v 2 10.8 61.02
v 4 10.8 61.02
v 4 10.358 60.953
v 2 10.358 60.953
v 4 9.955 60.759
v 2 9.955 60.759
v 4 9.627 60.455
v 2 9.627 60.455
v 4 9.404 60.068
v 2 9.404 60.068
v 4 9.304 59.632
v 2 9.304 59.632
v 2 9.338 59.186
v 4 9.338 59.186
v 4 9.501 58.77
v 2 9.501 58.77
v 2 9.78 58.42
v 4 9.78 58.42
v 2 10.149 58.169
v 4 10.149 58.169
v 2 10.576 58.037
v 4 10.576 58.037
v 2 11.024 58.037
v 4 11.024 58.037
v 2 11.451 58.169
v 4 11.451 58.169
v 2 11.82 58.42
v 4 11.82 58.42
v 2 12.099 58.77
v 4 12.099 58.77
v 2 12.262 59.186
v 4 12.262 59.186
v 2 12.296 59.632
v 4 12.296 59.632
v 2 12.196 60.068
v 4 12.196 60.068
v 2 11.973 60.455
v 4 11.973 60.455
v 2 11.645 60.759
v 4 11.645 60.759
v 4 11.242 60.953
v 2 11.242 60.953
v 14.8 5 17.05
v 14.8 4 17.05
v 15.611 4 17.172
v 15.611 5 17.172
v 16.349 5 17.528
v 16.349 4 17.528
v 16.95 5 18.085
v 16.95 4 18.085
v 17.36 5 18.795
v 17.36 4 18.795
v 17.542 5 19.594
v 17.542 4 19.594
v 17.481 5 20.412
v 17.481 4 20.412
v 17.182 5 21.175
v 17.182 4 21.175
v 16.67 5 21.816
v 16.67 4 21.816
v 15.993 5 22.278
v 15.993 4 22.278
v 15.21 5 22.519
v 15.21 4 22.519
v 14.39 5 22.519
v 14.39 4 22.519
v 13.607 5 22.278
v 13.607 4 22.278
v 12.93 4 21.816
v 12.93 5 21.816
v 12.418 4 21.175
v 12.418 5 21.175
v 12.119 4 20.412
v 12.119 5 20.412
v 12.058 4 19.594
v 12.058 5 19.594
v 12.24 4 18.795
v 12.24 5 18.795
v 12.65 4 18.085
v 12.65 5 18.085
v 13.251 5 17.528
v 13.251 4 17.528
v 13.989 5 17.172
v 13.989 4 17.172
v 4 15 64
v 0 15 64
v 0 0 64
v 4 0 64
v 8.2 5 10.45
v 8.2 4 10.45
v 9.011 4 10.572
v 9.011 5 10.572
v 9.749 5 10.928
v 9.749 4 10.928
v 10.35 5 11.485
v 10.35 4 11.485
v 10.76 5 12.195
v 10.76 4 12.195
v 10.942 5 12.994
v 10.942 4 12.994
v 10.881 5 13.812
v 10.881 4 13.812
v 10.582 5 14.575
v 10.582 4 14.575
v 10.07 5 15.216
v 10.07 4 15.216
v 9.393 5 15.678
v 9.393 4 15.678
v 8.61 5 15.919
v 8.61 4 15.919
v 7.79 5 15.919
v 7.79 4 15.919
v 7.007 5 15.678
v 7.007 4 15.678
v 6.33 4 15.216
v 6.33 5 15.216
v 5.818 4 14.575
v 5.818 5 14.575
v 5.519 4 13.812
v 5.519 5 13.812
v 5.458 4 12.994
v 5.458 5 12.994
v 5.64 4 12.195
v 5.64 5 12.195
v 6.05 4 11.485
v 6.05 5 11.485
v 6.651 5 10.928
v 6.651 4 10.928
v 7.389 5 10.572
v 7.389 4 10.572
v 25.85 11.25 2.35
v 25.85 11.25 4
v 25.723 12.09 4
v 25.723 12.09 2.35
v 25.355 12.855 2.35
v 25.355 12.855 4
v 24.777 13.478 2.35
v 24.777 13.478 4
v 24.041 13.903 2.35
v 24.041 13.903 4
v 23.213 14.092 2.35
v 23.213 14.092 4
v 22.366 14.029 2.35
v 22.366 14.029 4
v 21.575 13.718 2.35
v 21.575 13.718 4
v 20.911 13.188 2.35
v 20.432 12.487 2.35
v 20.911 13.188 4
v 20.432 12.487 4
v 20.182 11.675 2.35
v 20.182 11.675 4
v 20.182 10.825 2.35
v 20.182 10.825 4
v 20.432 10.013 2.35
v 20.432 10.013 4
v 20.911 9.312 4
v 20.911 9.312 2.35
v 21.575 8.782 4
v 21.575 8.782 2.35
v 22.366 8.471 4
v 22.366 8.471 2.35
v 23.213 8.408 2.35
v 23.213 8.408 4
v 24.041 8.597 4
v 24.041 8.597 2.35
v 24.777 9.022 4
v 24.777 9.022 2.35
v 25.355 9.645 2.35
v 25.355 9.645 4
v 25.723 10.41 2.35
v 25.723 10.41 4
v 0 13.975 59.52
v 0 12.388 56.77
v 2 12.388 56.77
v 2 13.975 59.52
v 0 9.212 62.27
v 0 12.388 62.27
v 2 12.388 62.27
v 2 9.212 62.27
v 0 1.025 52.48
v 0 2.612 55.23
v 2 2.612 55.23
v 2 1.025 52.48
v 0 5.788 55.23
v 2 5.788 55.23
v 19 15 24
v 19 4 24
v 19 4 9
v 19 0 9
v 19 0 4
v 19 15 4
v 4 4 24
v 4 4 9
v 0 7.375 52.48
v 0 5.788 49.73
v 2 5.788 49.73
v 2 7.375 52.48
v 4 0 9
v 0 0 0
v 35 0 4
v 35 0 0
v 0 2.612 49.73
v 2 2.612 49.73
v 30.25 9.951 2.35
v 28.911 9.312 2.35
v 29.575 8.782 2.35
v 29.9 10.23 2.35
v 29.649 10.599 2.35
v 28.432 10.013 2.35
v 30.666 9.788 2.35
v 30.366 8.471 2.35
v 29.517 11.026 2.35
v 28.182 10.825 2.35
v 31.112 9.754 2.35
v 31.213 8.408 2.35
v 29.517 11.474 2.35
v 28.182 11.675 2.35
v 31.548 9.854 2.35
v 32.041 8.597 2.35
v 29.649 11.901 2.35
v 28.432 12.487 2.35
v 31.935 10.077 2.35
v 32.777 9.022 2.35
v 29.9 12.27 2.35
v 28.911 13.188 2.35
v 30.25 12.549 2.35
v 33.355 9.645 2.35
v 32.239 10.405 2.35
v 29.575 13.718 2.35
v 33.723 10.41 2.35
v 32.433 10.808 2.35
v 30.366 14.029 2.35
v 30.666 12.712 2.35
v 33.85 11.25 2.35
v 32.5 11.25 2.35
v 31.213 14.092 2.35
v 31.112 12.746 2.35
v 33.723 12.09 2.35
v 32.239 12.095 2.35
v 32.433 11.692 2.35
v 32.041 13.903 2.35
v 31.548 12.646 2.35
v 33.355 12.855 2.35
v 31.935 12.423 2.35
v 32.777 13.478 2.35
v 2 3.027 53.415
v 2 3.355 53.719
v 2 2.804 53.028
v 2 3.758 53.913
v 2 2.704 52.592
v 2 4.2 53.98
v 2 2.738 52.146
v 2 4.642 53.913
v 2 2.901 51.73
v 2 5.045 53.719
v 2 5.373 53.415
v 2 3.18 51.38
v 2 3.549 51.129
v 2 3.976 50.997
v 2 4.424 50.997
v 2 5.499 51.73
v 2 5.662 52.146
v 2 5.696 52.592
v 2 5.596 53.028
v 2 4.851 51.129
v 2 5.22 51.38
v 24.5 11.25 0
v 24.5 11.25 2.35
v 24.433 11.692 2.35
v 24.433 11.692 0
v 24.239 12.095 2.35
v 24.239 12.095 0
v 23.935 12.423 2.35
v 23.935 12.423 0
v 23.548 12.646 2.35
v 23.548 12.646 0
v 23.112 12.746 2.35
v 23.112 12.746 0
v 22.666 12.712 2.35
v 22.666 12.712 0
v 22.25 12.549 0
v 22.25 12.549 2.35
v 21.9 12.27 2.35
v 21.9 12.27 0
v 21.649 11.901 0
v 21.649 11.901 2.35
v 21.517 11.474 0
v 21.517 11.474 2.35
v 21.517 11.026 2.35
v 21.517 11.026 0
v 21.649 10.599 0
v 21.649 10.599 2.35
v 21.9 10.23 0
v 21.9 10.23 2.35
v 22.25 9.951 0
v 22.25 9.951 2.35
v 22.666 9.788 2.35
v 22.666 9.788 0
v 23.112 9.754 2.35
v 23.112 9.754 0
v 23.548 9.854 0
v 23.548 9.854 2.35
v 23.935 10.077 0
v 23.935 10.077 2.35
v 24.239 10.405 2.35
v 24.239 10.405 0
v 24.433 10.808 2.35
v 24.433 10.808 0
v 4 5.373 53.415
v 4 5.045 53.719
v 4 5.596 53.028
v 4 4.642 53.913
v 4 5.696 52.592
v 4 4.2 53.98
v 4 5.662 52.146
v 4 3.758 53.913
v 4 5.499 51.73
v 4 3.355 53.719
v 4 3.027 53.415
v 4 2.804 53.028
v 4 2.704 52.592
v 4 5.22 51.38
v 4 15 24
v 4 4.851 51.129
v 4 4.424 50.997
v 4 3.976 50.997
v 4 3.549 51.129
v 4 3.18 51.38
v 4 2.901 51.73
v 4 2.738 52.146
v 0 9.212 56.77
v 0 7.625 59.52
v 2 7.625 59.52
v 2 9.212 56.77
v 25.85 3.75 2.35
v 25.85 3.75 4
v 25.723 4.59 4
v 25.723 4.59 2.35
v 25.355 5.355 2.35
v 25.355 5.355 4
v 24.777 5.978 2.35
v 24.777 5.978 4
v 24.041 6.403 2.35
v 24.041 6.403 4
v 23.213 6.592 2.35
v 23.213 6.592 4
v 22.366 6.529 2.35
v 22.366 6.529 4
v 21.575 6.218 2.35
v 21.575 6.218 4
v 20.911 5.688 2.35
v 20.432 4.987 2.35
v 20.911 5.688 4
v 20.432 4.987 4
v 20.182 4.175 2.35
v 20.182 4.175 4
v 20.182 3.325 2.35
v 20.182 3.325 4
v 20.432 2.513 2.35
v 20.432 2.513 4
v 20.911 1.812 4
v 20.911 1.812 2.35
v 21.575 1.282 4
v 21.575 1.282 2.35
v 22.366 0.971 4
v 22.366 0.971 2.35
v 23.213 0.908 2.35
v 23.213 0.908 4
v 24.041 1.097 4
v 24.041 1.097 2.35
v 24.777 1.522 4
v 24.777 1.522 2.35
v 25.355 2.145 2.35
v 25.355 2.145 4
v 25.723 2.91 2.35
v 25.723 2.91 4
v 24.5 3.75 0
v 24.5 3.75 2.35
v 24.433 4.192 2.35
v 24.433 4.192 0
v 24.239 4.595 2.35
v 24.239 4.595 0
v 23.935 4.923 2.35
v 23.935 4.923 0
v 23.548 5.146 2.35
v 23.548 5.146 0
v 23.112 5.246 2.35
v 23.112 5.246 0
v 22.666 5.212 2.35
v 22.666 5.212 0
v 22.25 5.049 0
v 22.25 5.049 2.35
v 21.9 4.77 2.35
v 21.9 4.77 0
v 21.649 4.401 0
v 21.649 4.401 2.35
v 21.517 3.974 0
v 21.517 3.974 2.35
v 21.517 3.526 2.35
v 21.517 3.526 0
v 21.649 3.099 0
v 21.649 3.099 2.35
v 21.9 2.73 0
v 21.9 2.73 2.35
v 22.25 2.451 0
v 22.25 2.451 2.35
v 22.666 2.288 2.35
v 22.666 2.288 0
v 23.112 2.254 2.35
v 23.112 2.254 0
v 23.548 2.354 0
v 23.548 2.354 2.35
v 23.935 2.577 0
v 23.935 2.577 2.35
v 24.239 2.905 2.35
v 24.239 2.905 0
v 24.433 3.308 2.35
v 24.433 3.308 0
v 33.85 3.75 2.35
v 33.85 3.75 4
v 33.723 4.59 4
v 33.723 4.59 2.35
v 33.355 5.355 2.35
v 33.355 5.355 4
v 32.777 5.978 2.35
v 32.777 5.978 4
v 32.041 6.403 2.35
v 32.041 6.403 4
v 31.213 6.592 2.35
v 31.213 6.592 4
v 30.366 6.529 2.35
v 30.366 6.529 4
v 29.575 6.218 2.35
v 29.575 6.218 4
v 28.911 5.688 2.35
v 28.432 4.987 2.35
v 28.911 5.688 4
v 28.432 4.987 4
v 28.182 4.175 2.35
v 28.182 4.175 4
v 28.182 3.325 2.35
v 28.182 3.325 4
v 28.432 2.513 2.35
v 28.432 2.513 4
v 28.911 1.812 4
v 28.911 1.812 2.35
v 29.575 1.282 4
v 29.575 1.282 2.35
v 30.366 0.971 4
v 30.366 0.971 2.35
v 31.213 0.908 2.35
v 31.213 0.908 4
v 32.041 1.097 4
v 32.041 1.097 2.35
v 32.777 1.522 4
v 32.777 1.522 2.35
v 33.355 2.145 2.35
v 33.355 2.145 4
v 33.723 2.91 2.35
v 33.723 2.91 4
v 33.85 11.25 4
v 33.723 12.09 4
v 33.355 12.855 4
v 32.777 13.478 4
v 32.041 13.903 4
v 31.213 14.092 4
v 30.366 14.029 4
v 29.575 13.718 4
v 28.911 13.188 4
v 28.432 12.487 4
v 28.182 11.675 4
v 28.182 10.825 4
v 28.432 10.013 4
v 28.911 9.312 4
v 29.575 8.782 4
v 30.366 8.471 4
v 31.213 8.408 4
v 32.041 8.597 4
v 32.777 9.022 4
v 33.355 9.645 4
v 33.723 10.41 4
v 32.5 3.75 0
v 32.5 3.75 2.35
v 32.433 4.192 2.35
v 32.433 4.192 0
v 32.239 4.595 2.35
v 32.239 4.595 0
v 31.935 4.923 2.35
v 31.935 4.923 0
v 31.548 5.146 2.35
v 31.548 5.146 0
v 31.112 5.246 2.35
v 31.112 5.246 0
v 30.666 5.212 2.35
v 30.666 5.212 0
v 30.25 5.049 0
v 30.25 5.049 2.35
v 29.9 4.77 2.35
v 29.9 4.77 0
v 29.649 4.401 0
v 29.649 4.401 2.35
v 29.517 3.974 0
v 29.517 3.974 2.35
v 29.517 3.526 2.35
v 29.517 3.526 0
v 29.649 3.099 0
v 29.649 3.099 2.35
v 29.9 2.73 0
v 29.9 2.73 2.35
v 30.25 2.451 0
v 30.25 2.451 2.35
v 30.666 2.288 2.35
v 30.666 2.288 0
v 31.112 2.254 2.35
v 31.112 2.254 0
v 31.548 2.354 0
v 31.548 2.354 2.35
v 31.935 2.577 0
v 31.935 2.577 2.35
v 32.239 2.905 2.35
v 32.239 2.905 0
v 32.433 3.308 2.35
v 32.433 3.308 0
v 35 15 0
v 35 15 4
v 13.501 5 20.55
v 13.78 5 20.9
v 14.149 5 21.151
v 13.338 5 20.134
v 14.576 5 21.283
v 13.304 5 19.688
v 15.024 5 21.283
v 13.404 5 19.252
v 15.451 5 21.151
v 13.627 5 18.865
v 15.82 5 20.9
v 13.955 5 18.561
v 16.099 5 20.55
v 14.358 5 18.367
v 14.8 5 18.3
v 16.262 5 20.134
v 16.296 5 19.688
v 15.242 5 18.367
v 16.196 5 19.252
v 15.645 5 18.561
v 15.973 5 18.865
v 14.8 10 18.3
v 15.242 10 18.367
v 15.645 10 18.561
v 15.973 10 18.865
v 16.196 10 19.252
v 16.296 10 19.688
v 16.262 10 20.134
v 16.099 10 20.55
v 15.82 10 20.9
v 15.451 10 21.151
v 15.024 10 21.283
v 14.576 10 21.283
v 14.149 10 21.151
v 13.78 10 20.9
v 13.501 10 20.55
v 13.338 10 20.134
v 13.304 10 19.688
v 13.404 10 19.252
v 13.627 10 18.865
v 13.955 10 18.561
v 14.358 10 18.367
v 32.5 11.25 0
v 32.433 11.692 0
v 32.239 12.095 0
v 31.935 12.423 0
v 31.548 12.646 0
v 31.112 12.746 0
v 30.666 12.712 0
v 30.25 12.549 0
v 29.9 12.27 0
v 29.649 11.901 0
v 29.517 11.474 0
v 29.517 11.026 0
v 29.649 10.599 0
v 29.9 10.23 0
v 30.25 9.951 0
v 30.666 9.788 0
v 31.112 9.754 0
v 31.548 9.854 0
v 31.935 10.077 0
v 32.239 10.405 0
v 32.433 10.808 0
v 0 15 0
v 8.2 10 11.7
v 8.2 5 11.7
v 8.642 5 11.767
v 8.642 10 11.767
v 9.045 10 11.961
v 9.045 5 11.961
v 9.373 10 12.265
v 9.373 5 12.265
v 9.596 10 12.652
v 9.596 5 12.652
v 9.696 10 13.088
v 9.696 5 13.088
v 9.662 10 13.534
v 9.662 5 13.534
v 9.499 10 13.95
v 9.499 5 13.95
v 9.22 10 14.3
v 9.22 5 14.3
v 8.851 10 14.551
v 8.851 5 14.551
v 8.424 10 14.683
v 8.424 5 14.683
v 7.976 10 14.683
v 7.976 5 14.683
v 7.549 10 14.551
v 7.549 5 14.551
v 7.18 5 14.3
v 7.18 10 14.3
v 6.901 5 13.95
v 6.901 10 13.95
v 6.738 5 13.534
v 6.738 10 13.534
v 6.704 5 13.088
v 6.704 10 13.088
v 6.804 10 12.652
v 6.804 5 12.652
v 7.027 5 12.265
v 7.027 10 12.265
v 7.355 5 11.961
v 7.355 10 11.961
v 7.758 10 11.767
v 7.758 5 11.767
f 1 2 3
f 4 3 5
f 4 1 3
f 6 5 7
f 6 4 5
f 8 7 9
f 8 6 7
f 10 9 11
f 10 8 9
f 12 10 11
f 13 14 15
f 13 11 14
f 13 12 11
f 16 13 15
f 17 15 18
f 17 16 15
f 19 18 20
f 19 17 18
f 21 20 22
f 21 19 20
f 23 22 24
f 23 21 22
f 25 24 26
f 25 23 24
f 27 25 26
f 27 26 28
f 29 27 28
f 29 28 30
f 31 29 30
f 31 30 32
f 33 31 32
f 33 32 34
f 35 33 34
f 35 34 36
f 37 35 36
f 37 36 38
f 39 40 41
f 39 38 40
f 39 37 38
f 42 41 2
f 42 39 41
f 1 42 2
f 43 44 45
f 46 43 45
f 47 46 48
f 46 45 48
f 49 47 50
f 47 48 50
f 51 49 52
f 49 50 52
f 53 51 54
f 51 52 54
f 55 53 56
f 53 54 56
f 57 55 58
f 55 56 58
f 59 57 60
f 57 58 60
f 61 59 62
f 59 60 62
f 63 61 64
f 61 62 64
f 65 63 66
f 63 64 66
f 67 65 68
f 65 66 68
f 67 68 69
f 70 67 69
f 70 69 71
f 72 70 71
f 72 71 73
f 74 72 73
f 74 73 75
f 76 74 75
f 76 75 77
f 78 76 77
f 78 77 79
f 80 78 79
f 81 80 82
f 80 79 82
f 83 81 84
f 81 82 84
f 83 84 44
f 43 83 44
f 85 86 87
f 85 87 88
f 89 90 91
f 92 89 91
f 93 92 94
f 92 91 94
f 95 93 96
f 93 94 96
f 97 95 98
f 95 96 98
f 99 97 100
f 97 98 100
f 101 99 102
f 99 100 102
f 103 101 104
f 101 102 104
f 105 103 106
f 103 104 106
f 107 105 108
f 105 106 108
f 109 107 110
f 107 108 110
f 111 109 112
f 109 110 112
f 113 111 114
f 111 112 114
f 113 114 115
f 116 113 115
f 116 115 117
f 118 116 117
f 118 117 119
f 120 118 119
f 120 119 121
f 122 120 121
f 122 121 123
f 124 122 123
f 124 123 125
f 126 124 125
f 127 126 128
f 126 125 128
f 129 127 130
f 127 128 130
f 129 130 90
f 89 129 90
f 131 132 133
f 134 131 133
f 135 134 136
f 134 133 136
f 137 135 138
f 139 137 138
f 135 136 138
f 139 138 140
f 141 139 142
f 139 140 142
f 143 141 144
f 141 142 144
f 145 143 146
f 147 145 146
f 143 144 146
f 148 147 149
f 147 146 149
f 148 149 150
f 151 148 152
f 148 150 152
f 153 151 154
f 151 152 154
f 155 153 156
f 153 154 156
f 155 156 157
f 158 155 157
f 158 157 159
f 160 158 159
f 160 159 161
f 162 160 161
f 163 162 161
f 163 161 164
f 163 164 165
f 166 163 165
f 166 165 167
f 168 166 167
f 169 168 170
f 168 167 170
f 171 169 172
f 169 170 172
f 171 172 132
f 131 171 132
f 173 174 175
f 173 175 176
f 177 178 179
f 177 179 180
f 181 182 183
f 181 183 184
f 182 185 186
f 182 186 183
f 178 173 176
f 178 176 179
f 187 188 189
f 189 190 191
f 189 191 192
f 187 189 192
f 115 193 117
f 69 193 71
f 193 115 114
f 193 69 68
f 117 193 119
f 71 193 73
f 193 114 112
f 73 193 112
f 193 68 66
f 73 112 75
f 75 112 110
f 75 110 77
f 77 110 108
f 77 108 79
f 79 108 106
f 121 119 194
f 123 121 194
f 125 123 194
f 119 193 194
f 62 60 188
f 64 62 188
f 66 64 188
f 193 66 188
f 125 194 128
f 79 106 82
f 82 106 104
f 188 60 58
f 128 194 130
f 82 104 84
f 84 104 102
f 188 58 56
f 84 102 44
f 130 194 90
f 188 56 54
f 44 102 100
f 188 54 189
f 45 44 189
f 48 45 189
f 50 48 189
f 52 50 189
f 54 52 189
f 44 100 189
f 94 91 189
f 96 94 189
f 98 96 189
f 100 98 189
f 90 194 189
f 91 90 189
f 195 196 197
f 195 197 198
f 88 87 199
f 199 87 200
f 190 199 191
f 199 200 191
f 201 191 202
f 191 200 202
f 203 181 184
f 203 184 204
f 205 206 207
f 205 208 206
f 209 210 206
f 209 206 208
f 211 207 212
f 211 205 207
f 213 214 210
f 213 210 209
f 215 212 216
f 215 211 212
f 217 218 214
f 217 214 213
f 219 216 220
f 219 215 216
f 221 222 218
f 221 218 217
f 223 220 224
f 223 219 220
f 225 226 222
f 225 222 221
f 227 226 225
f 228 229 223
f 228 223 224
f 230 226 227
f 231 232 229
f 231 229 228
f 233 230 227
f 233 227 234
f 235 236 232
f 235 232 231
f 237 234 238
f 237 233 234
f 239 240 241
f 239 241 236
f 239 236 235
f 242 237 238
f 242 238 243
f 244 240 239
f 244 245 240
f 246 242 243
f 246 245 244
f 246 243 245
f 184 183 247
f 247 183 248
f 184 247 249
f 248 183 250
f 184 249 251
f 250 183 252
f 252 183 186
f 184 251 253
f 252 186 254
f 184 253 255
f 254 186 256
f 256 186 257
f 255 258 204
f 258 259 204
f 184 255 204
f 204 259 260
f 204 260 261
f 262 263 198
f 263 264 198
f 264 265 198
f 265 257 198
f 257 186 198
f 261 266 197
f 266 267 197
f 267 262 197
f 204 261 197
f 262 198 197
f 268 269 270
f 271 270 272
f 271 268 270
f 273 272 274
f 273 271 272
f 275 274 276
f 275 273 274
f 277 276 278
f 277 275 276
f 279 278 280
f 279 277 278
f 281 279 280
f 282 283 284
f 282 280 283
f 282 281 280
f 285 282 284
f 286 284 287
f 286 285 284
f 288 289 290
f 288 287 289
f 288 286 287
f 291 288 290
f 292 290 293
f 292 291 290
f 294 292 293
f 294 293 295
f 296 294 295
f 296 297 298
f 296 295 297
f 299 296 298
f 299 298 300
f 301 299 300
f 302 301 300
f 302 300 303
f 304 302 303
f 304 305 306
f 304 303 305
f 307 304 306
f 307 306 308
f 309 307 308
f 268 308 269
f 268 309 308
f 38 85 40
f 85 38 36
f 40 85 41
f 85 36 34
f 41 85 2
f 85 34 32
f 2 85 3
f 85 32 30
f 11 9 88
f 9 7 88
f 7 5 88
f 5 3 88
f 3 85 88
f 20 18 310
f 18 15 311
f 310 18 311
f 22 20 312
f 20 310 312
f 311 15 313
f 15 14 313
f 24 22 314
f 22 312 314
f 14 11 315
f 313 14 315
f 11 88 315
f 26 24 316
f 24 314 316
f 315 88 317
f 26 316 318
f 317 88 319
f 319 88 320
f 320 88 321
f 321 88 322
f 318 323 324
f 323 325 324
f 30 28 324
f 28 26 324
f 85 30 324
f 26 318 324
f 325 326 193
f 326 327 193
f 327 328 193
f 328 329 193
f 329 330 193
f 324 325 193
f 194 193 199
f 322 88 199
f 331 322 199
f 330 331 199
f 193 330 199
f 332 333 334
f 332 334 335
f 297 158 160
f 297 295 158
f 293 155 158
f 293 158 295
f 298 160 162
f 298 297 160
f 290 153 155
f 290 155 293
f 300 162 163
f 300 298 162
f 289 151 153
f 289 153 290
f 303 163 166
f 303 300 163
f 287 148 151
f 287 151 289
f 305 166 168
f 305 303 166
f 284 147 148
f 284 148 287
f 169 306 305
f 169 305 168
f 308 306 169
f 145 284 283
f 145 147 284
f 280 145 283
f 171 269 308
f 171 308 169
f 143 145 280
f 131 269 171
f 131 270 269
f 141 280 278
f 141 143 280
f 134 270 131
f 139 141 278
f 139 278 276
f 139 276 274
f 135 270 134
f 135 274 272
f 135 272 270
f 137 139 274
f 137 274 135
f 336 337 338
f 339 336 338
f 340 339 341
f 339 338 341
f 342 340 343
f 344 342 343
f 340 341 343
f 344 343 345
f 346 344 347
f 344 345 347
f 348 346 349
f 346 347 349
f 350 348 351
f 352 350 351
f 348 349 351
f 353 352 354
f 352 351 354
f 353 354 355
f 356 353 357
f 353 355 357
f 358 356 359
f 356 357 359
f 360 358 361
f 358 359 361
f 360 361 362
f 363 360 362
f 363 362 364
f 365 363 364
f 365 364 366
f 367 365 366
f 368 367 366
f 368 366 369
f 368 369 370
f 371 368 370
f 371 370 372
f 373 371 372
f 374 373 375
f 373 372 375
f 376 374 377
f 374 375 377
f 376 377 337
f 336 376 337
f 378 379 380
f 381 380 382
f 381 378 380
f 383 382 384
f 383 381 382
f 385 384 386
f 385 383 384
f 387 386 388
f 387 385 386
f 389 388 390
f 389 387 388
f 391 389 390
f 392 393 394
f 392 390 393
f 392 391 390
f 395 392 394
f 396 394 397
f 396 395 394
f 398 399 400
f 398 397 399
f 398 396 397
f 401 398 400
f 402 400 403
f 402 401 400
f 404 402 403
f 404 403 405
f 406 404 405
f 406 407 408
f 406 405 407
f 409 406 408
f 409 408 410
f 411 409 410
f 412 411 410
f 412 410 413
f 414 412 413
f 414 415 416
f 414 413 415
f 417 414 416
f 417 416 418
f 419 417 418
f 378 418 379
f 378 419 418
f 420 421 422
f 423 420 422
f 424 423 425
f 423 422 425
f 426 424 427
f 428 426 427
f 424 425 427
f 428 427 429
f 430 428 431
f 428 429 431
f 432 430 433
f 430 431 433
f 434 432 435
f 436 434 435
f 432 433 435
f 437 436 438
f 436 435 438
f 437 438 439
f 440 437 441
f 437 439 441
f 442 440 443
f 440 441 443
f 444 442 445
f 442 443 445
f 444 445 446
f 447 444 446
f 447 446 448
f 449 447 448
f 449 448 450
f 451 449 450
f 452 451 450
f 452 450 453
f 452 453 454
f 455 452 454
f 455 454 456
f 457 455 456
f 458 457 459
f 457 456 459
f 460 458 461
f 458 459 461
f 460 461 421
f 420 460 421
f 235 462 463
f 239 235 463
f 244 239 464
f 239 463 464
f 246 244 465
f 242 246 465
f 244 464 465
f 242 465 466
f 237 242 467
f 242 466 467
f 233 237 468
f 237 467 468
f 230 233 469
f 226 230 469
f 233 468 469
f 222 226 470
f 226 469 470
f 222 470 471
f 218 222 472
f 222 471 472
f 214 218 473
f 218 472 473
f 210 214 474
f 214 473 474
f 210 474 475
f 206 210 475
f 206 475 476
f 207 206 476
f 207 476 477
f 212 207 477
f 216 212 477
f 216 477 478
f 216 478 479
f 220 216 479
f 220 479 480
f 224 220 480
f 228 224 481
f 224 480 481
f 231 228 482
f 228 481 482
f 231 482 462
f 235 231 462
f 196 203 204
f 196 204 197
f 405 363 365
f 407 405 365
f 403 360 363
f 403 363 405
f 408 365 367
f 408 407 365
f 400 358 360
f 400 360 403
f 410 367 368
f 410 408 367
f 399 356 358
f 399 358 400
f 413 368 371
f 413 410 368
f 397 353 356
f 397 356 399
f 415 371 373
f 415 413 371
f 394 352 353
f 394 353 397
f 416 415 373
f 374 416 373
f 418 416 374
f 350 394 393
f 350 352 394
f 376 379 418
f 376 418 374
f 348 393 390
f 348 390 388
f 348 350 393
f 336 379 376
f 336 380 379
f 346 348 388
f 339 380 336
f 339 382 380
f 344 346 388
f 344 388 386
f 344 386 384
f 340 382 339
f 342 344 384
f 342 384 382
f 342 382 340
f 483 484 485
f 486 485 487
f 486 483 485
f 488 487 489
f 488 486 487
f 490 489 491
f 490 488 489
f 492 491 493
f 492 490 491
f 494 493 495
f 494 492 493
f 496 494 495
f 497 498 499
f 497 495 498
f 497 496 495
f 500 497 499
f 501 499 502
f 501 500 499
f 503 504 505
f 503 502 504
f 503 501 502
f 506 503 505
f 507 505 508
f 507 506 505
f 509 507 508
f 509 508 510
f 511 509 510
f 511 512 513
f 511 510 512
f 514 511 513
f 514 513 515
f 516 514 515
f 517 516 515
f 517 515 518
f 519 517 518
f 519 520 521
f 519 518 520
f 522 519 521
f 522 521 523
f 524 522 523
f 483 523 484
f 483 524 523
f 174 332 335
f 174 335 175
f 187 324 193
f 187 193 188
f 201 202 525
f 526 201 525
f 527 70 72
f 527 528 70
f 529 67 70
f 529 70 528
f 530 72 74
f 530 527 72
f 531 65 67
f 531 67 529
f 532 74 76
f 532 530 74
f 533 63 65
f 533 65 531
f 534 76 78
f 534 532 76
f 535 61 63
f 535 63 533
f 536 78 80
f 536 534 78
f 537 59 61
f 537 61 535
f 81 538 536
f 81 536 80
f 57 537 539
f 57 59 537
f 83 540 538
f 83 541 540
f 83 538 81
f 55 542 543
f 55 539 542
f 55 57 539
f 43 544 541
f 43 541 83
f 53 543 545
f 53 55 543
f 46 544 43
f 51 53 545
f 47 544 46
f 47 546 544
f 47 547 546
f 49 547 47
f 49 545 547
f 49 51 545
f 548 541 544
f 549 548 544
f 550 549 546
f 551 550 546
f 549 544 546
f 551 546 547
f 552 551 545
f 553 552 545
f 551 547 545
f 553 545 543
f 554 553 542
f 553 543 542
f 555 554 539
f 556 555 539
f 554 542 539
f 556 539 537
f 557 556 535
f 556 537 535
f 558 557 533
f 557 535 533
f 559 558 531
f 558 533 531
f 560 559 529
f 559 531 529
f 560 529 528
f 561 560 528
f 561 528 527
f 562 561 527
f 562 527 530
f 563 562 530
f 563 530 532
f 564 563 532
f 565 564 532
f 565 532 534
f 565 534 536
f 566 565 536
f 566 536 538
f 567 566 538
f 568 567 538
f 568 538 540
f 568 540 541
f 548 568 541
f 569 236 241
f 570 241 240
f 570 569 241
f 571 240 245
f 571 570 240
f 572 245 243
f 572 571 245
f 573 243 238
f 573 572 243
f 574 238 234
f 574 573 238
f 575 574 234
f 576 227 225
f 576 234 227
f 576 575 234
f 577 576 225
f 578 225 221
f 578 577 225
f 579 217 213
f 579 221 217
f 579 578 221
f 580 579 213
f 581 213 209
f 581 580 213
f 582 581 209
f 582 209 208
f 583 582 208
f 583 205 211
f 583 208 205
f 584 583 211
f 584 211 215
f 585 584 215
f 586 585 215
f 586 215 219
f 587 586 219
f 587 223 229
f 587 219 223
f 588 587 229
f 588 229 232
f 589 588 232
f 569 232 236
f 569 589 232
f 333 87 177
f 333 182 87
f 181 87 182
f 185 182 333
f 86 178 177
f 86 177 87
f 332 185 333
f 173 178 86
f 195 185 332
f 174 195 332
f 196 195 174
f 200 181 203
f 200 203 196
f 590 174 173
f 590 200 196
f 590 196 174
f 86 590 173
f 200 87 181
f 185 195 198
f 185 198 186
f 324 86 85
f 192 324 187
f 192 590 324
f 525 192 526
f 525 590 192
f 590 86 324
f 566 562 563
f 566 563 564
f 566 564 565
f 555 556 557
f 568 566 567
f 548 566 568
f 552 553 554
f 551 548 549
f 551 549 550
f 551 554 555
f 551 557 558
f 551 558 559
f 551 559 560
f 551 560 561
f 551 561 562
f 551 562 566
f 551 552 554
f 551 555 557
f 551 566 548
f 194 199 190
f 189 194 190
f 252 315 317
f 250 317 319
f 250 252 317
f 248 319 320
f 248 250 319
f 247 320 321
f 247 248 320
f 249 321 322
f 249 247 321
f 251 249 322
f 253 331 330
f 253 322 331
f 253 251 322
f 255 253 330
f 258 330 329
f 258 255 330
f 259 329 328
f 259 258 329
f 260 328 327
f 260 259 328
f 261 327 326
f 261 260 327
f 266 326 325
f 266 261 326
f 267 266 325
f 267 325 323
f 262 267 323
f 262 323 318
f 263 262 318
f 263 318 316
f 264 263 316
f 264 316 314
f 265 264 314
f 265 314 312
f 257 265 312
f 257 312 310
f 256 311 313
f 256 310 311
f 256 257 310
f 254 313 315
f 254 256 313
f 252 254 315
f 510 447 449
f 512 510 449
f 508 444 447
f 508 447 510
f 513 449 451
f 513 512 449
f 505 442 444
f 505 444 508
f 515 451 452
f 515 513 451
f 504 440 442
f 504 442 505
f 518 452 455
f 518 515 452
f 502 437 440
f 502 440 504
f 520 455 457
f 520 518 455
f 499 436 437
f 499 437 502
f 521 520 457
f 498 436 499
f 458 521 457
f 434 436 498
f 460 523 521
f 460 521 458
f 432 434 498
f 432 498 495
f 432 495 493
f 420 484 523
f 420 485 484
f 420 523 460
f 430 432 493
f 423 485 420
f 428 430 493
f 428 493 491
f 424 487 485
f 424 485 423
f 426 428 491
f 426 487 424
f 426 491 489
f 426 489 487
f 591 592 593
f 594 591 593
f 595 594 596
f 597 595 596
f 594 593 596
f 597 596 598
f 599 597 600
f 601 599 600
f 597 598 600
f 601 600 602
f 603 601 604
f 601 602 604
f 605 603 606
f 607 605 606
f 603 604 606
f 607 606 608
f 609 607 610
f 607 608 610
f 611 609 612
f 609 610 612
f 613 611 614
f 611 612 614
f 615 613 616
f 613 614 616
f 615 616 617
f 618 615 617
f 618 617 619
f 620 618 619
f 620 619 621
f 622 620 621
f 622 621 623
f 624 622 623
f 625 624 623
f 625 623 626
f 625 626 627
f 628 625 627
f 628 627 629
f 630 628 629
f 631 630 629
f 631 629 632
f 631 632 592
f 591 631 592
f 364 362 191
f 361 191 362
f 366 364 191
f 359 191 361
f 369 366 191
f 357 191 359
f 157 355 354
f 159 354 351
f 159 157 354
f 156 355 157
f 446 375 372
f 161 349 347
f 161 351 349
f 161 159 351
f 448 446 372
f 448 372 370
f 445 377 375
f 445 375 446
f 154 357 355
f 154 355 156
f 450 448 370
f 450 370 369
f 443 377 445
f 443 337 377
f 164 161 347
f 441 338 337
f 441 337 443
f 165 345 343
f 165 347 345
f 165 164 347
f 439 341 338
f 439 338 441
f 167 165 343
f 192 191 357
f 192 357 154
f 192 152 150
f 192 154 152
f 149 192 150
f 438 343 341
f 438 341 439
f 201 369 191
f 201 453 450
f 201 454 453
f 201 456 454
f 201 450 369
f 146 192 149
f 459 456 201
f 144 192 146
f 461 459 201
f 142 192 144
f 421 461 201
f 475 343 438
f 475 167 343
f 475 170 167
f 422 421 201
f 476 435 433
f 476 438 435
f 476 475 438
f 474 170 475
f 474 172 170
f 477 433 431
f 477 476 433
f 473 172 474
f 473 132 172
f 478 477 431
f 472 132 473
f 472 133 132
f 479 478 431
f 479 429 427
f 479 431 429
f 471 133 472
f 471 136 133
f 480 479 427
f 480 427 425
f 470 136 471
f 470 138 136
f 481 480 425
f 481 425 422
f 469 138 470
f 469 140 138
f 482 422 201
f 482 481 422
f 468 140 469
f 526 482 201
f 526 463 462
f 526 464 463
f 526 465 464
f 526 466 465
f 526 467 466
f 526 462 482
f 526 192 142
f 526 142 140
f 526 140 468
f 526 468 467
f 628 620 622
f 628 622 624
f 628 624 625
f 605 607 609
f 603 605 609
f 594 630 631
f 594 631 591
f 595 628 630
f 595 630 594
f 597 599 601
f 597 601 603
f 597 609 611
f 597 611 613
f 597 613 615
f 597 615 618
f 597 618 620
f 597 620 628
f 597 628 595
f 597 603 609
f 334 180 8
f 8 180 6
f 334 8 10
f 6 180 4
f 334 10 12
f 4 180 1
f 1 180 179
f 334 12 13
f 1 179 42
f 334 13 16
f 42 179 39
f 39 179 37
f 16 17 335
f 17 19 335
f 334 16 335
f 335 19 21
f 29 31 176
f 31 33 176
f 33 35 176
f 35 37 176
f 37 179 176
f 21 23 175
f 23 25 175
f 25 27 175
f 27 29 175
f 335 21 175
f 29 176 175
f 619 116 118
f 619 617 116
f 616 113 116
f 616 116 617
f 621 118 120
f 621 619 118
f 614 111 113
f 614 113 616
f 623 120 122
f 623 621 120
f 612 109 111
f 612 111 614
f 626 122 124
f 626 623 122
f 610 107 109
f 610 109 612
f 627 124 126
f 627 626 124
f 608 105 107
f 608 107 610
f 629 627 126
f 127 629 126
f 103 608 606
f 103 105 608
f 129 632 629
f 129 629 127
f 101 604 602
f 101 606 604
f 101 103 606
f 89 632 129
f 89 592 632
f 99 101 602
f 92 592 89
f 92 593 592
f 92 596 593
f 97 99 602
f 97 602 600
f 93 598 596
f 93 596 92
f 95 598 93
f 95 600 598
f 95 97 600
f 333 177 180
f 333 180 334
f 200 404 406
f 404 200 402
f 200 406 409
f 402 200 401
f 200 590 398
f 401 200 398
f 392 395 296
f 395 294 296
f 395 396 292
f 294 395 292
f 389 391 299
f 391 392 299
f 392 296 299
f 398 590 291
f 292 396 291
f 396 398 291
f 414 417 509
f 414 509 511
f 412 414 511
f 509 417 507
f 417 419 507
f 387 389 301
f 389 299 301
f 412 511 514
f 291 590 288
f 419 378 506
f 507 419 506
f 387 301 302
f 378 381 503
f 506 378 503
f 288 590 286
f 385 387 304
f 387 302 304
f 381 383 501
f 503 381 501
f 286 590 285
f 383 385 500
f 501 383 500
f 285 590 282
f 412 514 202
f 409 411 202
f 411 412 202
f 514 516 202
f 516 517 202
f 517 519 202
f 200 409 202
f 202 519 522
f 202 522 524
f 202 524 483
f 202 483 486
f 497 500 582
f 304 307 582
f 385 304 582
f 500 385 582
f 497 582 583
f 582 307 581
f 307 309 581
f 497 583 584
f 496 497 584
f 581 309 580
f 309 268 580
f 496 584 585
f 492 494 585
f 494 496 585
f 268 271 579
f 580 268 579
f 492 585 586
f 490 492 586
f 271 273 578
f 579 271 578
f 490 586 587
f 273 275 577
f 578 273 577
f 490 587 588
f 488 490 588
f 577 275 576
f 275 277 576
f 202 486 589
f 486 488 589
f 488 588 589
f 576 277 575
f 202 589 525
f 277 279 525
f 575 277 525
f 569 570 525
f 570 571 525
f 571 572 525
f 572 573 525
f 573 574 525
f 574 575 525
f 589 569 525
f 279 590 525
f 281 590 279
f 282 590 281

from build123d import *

# Parameters (mm, degrees)
CROQUIS1_W              = 15
CROQUIS1_H              = 15
CROQUIS1_W_2            = 4
CROQUIS1_W_3            = 16
CROQUIS1_R              = 1.5
SALIENTE_EXTRUIR1_DEPTH = 4
CROQUIS2_W              = 4
CROQUIS2_H              = 15
SALIENTE_EXTRUIR2_DEPTH = 60
CROQUIS3_W              = 15
CROQUIS3_H              = 15
SALIENTE_EXTRUIR3_DEPTH = 20
CROQUIS9_R              = 2.85
CORTAR_EXTRUIR3_DEPTH   = 1.65
CORTAR_EXTRUIR4_REACH   = 76.471
CROQUIS4_R              = 1.5
CROQUIS4_3_R            = 1.5
CORTAR_EXTRUIR5_DEPTH   = 2
CROQUIS10_W             = 15
CROQUIS10_H             = 15
CORTAR_EXTRUIR6_DEPTH   = 4
CROQUIS11_R             = 1.5
CORTAR_EXTRUIR7_DEPTH   = 6
CROQUIS12_R             = 2.75
CORTAR_EXTRUIR9_DEPTH   = 1


with BuildPart() as part:
    # Croquis1 → Saliente-Extruir1 (new body)
    # profile 1 of 3: a face of its own
    with BuildSketch(Plane.XY):
        with Locations((11.5, 7.5)):
            Rectangle(CROQUIS1_W, CROQUIS1_H)
    # profile 2 of 3: a face of its own
    with BuildSketch(Plane.XY):
        with Locations((2, 7.5)):
            Rectangle(CROQUIS1_W_2, CROQUIS1_H)
    # profile 3 of 3: a face of its own
    with BuildSketch(Plane.XY):
        with Locations((27, 7.5)):
            Rectangle(CROQUIS1_W_3, CROQUIS1_H)
        with Locations((23, 11.25)):
            Circle(CROQUIS1_R, mode=Mode.SUBTRACT)
        with Locations((31, 11.25)):
            Circle(CROQUIS1_R, mode=Mode.SUBTRACT)
        with Locations((31, 3.75)):
            Circle(CROQUIS1_R, mode=Mode.SUBTRACT)
        with Locations((23, 3.75)):
            Circle(CROQUIS1_R, mode=Mode.SUBTRACT)
    extrude(amount=SALIENTE_EXTRUIR1_DEPTH)

    # Croquis2 → Saliente-Extruir2 (add)
    with BuildSketch(Plane.XY.offset(4)):
        with Locations((2, 7.5)):
            Rectangle(CROQUIS2_W, CROQUIS2_H)
    extrude(amount=SALIENTE_EXTRUIR2_DEPTH)

    # Croquis3 → Saliente-Extruir3 (add)
    with BuildSketch(Plane.XY.offset(4)):
        with Locations((11.5, 7.5)):
            Rectangle(CROQUIS3_W, CROQUIS3_H)
    extrude(amount=SALIENTE_EXTRUIR3_DEPTH)

    # Croquis9 → Cortar-Extruir3 (cut)
    with BuildSketch(Plane.XY.offset(4)):
        with Locations((23, 3.75)):
            Circle(CROQUIS9_R)
        with Locations((31, 3.75)):
            Circle(CROQUIS9_R)
        with Locations((23, 11.25)):
            Circle(CROQUIS9_R)
        with Locations((31, 11.25)):
            Circle(CROQUIS9_R)
    extrude(amount=-CORTAR_EXTRUIR3_DEPTH, mode=Mode.SUBTRACT)

    # Croquis4 → Cortar-Extruir4 (cut, up to next)
    with BuildSketch(Plane(origin=(0, 0, 0), x_dir=(0, 0, -1), z_dir=(1, 0, 0)), mode=Mode.PRIVATE) as cortar_extruir4_sk1:
        with Locations(Location((-59.52, 10.8, 0), (0, 0, 180))):
            Circle(CROQUIS4_R)
    cortar_extruir4_tool1 = extrude(cortar_extruir4_sk1.sketch, amount=CORTAR_EXTRUIR4_REACH, mode=Mode.PRIVATE) & part.part
    # Croquis4 → Cortar-Extruir4 (cut, up to next)
    with BuildSketch(Plane(origin=(0, 0, 0), x_dir=(0, 0, -1), z_dir=(1, 0, 0)), mode=Mode.PRIVATE) as cortar_extruir4_sk2:
        with Locations(Location((-52.48, 4.2, 0), (0, 0, 180))):
            Circle(CROQUIS4_R)
    cortar_extruir4_tool2 = extrude(cortar_extruir4_sk2.sketch, amount=CORTAR_EXTRUIR4_REACH, mode=Mode.PRIVATE) & part.part
    add(cortar_extruir4_tool1.solids().sort_by_distance((0, 10.8, 59.52))[0], mode=Mode.SUBTRACT)
    add(cortar_extruir4_tool2.solids().sort_by_distance((0, 4.2, 52.48))[0], mode=Mode.SUBTRACT)

    # Croquis4<3> → Cortar-Extruir5 (cut)
    # profile 1 of 2: a face of its own
    with BuildSketch(Plane(origin=(0, 0, 0), x_dir=(0, 0, -1), z_dir=(1, 0, 0))):
        Polygon((-59.52, 13.975426481), (-62.27, 12.38771324), (-62.27, 9.21228676), (-59.52, 7.624573519), (-56.77, 9.21228676), (-56.77, 12.38771324), align=None)
        with Locations(Location((-59.52, 10.8, 0), (0, 0, 180))):
            Circle(CROQUIS4_3_R, mode=Mode.SUBTRACT)
    # profile 2 of 2: a face of its own
    with BuildSketch(Plane(origin=(0, 0, 0), x_dir=(0, 0, -1), z_dir=(1, 0, 0))):
        Polygon((-52.48, 7.375426481), (-55.23, 5.78771324), (-55.23, 2.61228676), (-52.48, 1.024573519), (-49.73, 2.61228676), (-49.73, 5.78771324), align=None)
        with Locations(Location((-52.48, 4.2, 0), (0, 0, 180))):
            Circle(CROQUIS4_3_R, mode=Mode.SUBTRACT)
    extrude(amount=CORTAR_EXTRUIR5_DEPTH, mode=Mode.SUBTRACT)

    # Croquis10 → Cortar-Extruir6 (cut)
    with BuildSketch(Plane(origin=(0, 0, 0), x_dir=(1, 0, 0), z_dir=(0, 1, 0))):
        with Locations((11.5, -16.5)):
            Rectangle(CROQUIS10_W, CROQUIS10_H)
    extrude(amount=CORTAR_EXTRUIR6_DEPTH, mode=Mode.SUBTRACT)

    # Croquis11 → Cortar-Extruir7 (cut)
    with BuildSketch(Plane(origin=(0, 4, 0), x_dir=(-1, 0, 0), z_dir=(0, -1, 0))):
        with Locations(Location((-8.2, -13.2, 0), (0, 0, 90))):
            Circle(CROQUIS11_R)
        with Locations(Location((-14.8, -19.8, 0), (0, 0, 90))):
            Circle(CROQUIS11_R)
    extrude(amount=-CORTAR_EXTRUIR7_DEPTH, mode=Mode.SUBTRACT)

    # Croquis12 → Cortar-Extruir9 (cut)
    with BuildSketch(Plane.XZ.offset(-4)):
        with Locations(Location((8.2, 13.2, 0), (0, 0, 270))):
            Circle(CROQUIS12_R)
        with Locations(Location((14.8, 19.8, 0), (0, 0, 270))):
            Circle(CROQUIS12_R)
    extrude(amount=-CORTAR_EXTRUIR9_DEPTH, mode=Mode.SUBTRACT)


solid = part.part
